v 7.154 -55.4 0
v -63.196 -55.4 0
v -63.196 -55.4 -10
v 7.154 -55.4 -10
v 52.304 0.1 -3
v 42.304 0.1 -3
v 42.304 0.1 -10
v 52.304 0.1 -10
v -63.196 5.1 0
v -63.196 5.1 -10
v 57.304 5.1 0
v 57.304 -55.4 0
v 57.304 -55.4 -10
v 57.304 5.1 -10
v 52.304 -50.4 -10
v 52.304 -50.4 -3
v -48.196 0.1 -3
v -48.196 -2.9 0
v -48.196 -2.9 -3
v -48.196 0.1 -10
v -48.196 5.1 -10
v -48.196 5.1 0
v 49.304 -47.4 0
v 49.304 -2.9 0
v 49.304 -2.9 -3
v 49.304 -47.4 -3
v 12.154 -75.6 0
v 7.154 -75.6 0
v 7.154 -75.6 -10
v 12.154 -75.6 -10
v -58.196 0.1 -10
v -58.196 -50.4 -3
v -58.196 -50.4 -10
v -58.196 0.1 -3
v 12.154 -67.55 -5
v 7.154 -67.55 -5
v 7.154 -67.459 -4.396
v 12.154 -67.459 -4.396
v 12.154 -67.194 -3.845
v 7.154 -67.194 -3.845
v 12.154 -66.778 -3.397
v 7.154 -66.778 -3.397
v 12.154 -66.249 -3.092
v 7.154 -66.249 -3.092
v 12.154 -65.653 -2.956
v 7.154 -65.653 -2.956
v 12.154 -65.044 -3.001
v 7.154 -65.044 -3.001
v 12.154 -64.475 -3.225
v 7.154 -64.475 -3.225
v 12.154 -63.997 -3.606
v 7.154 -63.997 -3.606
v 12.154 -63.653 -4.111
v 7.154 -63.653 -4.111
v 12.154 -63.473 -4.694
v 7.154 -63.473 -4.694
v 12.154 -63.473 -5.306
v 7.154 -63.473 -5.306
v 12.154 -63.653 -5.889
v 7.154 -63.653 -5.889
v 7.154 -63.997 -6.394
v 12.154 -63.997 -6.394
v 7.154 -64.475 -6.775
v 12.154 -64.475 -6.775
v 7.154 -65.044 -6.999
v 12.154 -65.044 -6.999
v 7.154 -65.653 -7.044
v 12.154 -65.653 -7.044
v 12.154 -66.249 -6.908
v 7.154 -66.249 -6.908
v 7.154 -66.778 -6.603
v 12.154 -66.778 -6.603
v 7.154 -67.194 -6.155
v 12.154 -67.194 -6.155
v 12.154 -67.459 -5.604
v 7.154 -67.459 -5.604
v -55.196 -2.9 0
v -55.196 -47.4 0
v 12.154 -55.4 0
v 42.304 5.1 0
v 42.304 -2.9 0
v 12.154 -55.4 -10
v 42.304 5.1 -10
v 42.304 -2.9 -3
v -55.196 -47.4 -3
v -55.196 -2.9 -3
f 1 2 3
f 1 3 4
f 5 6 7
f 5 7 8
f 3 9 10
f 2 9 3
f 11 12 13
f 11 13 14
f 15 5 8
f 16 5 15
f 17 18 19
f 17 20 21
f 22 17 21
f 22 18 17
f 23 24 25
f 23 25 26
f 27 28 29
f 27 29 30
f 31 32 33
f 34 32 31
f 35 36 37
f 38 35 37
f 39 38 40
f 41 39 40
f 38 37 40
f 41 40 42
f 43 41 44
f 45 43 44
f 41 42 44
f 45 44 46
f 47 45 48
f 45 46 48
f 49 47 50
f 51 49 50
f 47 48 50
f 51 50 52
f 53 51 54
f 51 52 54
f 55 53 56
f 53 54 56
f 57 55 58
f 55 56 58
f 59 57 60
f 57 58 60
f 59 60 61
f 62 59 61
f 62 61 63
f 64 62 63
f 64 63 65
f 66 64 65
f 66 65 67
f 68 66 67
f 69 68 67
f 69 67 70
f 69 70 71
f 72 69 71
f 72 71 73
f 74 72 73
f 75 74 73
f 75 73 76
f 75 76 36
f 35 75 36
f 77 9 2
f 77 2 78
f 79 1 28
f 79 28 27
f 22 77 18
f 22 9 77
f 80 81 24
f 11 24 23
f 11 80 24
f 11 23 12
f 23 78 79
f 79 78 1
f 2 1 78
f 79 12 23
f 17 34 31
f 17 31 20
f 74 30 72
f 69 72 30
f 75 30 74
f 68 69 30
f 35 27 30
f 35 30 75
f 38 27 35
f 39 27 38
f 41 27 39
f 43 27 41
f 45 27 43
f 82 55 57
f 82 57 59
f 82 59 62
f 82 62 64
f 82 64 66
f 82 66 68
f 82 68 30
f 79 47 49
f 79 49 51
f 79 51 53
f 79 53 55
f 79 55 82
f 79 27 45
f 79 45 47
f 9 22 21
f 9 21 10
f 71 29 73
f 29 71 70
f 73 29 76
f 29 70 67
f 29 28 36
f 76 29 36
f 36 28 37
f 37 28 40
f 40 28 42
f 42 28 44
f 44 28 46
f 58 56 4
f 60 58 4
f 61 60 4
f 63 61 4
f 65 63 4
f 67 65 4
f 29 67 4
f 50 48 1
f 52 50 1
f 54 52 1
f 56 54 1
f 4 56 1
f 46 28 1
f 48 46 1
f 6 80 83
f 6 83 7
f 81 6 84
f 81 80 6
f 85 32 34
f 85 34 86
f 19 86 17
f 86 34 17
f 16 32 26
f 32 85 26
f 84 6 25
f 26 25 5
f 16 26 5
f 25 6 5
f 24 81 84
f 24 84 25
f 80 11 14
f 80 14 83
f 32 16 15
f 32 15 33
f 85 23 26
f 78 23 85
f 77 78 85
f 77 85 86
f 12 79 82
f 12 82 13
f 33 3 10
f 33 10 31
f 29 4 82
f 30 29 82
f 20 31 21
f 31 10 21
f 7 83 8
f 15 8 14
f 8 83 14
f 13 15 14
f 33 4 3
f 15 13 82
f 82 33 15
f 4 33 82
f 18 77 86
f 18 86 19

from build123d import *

# Parameters (mm, degrees)
F0_W     = 5
F0_H     = 20.2
F1_DEPTH = 10
F3_D     = 4.1
F3_DEPTH = 7
F3_TIP   = 1.231764269
F4_DEPTH = 3


with BuildPart() as f1:
    # F0 (on Top) → F1 (new body)
    with BuildSketch(Plane.XY):
        Polygon((-58.1956532598, -40.4000989108), (-58.1956532598, 0.0999010892), (-48.1956532598, 0.0999010892), (-48.1956532598, 5.0999010892), (-63.1956532598, 5.0999010892), (-63.1956532598, -55.4000989108), (7.1543467402, -55.4000989108), (12.1543467402, -55.4000989108), (57.3043467402, -55.4000989108), (57.3043467402, 5.0999010892), (42.3043467402, 5.0999010892), (42.3043467402, 0.0999010892), (52.3043467402, 0.0999010892), (52.3043467402, -40.4000989108), (52.3043467402, -50.4000989108), (-58.1956532598, -50.4000989108), align=None)
        with Locations((9.6543467402, -65.5000989108)):
            Rectangle(F0_W, F0_H)
    extrude(amount=-F1_DEPTH)

    # F3
    with Locations(Plane.YZ.offset(12.1543467402)):
        with Locations((-65.5000989108, -5)):
            Hole(F3_D / 2, depth=F3_DEPTH)
            with Locations((0, 0, -(F3_DEPTH + F3_TIP / 2))):  # 118° drill point
                Cone(0, F3_D / 2, F3_TIP, mode=Mode.SUBTRACT)

    # F0 (on Top) → F4 (join)
    with BuildSketch(Plane.XY):
        Polygon((-55.1956532598, -40.4000989108), (-58.1956532598, -40.4000989108), (-58.1956532598, -50.4000989108), (52.3043467402, -50.4000989108), (52.3043467402, -40.4000989108), (49.3043467402, -40.4000989108), (49.3043467402, -47.4000989108), (-55.1956532598, -47.4000989108), align=None)
        Polygon((-48.1956532598, 0.0999010892), (-58.1956532598, 0.0999010892), (-58.1956532598, -40.4000989108), (-55.1956532598, -40.4000989108), (-55.1956532598, -2.9000989108), (-48.1956532598, -2.9000989108), align=None)
        Polygon((52.3043467402, 0.0999010892), (42.3043467402, 0.0999010892), (42.3043467402, -2.9000989108), (49.3043467402, -2.9000989108), (49.3043467402, -40.4000989108), (52.3043467402, -40.4000989108), align=None)
    extrude(amount=-F4_DEPTH)


solid = f1.part
